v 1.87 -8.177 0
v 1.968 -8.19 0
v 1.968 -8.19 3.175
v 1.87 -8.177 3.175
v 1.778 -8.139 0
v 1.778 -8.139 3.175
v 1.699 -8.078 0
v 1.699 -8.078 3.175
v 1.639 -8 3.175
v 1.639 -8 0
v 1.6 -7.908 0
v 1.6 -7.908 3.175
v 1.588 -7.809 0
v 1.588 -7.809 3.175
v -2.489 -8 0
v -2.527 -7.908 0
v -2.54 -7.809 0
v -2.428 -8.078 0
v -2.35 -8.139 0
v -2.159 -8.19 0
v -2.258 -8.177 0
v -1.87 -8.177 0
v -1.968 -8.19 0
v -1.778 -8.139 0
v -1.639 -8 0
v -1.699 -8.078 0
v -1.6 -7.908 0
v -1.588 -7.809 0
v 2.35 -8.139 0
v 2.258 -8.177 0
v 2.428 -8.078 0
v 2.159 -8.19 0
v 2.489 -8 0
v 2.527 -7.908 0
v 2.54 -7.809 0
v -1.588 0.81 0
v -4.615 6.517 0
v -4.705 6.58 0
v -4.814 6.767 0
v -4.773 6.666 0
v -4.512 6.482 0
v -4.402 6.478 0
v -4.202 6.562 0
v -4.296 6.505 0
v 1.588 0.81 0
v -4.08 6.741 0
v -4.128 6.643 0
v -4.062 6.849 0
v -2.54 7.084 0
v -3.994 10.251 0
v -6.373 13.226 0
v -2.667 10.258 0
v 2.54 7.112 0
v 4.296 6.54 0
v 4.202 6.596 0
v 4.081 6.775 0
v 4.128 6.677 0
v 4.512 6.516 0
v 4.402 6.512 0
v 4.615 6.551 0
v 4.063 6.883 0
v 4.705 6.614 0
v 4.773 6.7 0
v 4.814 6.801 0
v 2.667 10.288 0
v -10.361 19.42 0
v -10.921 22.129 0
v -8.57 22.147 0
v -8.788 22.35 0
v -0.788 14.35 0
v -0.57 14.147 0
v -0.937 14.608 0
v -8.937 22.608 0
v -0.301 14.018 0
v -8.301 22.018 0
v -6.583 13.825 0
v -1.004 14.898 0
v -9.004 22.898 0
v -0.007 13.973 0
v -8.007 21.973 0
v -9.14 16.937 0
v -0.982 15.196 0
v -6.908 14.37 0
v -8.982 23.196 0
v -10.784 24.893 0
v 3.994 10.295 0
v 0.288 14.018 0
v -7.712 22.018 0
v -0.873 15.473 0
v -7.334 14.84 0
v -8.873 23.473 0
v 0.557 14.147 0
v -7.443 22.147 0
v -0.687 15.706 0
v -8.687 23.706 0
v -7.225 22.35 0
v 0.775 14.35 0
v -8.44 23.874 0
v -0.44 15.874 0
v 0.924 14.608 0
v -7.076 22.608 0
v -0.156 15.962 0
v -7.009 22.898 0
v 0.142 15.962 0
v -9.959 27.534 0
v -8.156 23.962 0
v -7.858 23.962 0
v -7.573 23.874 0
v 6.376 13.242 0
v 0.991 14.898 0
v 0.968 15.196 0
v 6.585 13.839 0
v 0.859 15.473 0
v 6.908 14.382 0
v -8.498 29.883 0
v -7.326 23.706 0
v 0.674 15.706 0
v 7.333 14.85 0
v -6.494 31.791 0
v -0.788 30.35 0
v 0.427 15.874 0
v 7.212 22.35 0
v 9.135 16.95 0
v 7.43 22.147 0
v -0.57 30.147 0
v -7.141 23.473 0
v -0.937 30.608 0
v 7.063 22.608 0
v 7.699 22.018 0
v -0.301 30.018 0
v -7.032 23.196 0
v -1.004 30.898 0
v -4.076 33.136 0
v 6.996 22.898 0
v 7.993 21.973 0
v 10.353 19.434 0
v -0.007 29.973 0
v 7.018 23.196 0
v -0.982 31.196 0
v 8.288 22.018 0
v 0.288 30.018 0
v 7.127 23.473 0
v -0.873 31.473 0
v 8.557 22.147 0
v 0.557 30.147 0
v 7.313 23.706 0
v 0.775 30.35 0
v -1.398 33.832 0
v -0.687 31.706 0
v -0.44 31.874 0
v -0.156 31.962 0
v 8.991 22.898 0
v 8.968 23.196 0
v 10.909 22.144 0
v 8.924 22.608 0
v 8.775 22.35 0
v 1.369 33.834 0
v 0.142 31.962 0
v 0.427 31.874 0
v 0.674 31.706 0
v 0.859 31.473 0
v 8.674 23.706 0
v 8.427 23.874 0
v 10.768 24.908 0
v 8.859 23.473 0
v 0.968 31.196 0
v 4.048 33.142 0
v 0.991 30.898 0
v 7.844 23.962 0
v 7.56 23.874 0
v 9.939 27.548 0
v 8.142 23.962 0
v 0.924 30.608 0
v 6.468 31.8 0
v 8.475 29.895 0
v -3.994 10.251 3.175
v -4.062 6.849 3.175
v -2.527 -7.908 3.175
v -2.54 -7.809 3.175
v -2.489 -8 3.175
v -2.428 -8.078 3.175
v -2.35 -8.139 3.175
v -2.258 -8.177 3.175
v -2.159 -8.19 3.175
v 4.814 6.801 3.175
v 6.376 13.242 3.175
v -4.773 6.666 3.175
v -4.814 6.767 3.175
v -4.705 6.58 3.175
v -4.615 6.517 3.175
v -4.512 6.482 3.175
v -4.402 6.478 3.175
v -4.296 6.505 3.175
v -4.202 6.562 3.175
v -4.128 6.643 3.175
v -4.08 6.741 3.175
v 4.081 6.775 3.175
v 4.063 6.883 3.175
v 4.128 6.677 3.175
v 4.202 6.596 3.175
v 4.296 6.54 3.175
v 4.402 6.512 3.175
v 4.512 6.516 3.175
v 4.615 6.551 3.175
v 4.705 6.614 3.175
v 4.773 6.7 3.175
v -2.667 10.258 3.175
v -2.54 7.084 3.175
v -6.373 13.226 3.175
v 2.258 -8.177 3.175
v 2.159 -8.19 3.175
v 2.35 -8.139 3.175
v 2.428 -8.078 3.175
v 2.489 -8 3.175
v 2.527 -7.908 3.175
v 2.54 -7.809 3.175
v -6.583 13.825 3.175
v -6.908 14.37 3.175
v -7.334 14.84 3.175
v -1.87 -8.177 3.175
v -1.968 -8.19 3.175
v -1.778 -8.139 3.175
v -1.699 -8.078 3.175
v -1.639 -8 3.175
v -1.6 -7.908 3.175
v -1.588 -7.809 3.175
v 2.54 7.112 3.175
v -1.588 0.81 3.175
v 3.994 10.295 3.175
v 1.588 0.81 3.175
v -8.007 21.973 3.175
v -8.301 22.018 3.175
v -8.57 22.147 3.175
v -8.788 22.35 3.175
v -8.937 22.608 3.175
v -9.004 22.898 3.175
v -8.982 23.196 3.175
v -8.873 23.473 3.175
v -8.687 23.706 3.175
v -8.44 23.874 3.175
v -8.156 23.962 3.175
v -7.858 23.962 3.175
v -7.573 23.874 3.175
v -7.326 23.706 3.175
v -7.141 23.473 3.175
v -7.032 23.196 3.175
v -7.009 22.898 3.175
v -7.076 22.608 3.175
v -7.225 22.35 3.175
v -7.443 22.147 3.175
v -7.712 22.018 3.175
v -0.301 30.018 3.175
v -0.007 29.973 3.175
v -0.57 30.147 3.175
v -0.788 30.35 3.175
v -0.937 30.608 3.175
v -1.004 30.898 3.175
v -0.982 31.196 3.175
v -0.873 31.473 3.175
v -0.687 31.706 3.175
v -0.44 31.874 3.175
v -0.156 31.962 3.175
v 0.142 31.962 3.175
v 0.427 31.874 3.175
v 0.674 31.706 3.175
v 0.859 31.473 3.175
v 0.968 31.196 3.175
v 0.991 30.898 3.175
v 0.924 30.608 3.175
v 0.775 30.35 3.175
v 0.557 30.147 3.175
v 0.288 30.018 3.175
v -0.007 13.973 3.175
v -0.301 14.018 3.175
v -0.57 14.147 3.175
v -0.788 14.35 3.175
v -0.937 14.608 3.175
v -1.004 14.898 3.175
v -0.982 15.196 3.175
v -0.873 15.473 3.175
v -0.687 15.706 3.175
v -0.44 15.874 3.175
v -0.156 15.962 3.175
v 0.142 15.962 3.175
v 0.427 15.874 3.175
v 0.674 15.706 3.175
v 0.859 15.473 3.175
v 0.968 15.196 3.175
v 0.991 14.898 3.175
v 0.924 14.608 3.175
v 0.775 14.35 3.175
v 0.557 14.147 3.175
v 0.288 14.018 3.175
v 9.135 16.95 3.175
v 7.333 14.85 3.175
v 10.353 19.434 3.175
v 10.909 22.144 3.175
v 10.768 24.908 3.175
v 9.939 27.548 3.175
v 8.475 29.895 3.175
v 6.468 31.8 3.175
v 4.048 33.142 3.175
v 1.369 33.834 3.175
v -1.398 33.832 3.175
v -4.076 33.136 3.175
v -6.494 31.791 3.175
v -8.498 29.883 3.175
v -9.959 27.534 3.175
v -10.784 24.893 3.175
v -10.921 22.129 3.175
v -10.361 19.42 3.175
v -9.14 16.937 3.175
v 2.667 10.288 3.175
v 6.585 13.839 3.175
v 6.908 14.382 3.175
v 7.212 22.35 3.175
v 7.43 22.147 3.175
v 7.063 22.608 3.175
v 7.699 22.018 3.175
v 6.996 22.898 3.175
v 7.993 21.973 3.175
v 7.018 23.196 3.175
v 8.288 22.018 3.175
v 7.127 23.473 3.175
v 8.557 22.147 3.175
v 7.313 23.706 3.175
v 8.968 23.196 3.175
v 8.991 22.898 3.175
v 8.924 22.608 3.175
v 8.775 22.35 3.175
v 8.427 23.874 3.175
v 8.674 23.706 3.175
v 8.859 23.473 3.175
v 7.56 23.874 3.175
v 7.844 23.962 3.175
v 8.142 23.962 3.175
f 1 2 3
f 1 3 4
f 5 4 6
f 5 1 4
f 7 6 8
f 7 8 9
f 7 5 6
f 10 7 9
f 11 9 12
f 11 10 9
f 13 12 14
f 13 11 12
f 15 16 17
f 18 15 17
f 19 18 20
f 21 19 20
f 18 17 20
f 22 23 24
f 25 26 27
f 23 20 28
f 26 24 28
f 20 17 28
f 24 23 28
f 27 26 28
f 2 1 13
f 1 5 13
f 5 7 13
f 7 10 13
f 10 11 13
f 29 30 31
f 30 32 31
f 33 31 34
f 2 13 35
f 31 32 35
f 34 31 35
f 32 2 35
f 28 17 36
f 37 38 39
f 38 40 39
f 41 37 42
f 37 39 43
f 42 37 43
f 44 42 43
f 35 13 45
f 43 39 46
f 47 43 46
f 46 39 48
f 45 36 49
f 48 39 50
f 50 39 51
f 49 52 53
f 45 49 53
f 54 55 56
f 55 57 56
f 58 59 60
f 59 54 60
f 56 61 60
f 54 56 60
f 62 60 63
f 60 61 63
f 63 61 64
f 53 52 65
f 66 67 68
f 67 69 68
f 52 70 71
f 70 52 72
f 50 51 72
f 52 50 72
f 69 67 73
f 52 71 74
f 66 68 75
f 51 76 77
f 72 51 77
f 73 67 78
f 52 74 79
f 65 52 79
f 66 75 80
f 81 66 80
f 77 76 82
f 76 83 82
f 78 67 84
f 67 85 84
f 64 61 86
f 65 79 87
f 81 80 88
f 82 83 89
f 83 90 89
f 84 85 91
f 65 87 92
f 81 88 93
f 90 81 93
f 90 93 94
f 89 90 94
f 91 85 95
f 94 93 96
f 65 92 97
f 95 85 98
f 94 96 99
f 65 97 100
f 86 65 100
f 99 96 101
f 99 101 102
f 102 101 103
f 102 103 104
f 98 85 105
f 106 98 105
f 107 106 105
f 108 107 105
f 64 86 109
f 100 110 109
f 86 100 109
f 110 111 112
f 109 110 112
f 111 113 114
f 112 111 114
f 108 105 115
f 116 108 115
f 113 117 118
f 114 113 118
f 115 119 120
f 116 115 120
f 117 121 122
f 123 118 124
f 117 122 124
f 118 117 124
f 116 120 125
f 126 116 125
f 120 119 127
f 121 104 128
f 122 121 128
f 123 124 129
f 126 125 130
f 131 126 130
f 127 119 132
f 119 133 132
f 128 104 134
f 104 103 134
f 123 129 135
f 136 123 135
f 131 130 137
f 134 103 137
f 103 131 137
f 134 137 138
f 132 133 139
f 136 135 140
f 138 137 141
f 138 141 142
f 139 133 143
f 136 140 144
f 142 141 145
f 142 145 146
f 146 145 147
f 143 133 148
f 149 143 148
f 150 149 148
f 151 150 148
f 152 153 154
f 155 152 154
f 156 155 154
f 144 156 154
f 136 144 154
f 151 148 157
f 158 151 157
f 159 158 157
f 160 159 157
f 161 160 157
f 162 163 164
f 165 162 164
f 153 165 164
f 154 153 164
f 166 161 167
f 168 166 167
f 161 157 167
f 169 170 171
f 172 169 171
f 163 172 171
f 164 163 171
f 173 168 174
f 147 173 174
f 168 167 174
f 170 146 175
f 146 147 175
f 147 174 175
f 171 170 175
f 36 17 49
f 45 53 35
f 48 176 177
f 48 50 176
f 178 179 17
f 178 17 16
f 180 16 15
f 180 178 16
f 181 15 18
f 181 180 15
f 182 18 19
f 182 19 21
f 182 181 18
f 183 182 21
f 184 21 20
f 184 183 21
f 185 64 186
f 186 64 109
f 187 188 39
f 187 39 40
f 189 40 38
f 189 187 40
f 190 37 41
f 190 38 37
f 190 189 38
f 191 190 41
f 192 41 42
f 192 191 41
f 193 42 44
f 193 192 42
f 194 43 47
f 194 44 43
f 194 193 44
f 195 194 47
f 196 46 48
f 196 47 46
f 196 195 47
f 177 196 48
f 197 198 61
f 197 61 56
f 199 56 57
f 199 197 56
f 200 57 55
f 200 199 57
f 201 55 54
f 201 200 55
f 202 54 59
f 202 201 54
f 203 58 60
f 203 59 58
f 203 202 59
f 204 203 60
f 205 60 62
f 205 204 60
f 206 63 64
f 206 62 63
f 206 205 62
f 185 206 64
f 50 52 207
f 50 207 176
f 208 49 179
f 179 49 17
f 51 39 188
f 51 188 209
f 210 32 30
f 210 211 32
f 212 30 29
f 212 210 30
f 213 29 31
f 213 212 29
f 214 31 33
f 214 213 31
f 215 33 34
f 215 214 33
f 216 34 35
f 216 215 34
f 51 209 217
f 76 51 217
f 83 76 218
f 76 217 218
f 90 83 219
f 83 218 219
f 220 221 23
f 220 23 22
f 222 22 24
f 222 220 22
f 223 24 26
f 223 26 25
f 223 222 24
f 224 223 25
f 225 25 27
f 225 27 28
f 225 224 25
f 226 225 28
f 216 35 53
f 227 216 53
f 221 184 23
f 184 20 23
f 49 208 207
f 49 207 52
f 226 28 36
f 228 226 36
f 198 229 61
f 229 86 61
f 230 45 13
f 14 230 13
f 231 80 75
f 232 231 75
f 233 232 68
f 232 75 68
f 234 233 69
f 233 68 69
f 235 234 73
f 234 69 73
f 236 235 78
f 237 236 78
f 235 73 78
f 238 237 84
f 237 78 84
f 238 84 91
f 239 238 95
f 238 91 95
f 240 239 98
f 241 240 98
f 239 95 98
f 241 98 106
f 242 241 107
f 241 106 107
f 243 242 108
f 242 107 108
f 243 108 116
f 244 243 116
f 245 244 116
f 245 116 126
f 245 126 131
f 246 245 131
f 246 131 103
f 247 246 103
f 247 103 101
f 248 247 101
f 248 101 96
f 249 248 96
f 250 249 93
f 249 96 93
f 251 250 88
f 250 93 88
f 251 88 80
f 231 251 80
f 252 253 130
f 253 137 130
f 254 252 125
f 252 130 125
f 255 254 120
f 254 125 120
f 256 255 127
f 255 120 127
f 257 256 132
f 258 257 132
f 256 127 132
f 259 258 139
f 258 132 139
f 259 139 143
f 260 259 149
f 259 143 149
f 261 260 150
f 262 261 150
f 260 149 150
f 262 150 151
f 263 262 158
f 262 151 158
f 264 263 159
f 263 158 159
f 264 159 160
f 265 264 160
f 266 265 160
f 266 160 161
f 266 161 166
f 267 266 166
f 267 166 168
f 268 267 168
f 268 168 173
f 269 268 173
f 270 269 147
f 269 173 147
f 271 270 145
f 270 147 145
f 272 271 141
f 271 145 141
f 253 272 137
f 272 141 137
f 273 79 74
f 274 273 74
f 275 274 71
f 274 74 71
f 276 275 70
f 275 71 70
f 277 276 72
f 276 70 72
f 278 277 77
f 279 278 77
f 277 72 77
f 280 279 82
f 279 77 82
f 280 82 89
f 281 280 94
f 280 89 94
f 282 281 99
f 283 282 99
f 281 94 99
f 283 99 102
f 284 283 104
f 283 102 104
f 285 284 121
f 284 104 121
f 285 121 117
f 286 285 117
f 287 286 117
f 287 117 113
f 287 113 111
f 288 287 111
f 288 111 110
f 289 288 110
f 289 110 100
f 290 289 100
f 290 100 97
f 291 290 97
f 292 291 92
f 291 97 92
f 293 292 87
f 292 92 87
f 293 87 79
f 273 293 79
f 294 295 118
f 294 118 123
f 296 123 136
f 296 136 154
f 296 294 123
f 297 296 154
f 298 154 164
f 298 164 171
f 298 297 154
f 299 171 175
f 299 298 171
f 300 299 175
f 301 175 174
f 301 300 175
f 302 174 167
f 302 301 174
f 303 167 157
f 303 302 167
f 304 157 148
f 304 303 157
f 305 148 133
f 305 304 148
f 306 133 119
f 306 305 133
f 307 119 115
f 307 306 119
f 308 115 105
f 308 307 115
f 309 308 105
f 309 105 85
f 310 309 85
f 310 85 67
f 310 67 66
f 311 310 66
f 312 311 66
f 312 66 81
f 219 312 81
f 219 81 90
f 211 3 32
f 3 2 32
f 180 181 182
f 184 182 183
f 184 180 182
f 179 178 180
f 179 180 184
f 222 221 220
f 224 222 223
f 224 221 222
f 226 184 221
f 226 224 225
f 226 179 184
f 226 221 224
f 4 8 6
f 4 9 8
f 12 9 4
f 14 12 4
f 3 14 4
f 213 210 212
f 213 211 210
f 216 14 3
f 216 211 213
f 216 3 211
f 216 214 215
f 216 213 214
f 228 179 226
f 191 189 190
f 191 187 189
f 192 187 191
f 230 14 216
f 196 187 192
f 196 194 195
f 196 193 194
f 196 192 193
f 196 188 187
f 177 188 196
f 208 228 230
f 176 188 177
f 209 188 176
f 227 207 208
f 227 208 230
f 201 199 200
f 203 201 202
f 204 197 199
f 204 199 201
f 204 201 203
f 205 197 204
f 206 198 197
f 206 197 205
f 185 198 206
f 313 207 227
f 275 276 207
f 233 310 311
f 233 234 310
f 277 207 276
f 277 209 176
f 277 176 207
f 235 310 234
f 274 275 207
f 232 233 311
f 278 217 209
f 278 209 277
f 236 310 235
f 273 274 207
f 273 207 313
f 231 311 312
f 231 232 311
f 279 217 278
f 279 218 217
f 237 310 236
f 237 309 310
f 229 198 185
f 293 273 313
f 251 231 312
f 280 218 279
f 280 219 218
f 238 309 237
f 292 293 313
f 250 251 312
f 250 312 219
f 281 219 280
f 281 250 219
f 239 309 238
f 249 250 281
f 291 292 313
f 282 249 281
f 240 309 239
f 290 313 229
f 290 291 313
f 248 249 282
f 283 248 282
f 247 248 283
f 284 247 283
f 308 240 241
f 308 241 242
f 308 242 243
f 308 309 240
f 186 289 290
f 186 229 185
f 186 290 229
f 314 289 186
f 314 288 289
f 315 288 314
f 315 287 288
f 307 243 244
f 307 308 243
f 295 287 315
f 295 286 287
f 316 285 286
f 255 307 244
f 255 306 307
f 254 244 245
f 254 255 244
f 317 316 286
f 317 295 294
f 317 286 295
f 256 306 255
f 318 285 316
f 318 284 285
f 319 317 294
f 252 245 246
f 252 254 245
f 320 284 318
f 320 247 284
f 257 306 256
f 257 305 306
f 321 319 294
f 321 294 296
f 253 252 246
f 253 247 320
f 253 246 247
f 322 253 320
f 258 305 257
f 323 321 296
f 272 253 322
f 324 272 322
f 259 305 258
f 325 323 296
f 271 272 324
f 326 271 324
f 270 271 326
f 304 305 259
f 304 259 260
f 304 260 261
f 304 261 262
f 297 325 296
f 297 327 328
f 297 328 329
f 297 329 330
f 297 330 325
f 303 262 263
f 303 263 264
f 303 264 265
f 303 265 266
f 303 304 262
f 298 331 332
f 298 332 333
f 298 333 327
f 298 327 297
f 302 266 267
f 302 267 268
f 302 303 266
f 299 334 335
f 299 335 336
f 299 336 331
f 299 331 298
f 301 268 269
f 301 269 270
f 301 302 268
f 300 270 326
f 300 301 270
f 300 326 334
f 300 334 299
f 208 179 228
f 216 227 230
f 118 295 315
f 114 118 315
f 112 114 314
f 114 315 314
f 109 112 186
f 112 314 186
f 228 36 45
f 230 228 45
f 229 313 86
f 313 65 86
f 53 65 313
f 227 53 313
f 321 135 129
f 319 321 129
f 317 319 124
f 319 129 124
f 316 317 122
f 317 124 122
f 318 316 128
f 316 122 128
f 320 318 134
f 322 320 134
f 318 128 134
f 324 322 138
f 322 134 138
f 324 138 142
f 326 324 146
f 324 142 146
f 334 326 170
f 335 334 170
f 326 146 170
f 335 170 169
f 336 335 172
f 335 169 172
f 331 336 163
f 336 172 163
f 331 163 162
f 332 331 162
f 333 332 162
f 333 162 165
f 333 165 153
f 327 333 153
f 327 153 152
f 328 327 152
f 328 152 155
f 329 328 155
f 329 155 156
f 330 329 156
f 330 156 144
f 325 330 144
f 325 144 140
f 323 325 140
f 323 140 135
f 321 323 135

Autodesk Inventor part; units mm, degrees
ref_plane "YZ Plane" through (0, 0, 0) normal (1, 0, 0) x (0, 1, 0)
ref_plane "XZ Plane" through (0, 0, 0) normal (0, 1, 0) x (-1, 0, 0)
ref_plane "XY Plane" through (0, 0, 0) normal (0, 0, 1) x (1, 0, 0)
ref_plane "Work Plane1" through (0, -7.809, 0) normal (-1, 0, 0) x (0, 0, 1)
ref_plane "Work Plane2" through (0, 0, 1.5875) normal (0, 0, 1) x (1, 0, 0)
sketch "Sketch1" plane through (0, 0, 0) normal (0, 0, 1) x (1, 0, 0)
  line L0 (-2.54, -8.19) -> (2.54, -8.19)
  line L1 (2.54, -8.19) -> (2.54, 8.19)
  line L2 (-2.54, 8.19) -> (-2.54, -8.19)
  line L3 (-2.54, -8.19) -> (2.54, 8.19) construction
  line L4 (2.54, -8.19) -> (-2.54, 8.19) construction
  circle A0 centre (0, 16.6545) radius 2.5 construction
  circle A1 centre (0, 16.6545) radius 5
  arc A2 (6.8029, 15.0051) -> (-6.8044, 15.0114) centre (0, 16.6545) ccw
  line L5 (-2.54, 8.19) -> (-2.54, 10.2591)
  line L6 (2.54, 8.19) -> (2.54, 10.2869)
  line L7 (0, 0) -> (0, 10.7842) construction
  line L8 (-2.54, 10.2591) -> (-3.9944, 10.2511)
  line L9 (2.54, 10.2869) -> (3.9944, 10.2948)
  line L10 (-3.9944, 10.2511) -> (-4.1214, 3.9003)
  line L11 (3.9944, 10.2948) -> (4.1214, 3.9454)
  line L12 (-4.1214, 3.9003) -> (-6.8044, 15.0114)
  line L13 (4.1214, 3.9454) -> (6.8029, 15.0051)
  line L14 (0, 0) -> (0, 22.9511) construction
  point P0 (-3.2672, 10.2551)
  dimension "d16" = 0
  dimension "d2" = 5
  dimension "d3" = 10
  dimension "d4" = 14
  dimension "d8" = 1.5815
  dimension "d9" = 1.5815
  dimension "d10" = 6.35
  dimension "d11" = 6.35
  dimension "d18" = 1.4545
  dimension "d19" = 1.4545
  dimension "d31" = 2.54
  dimension "d32" = 2.54
  dimension "d33" = 0
extrude "Plate1" add sketch "Sketch1" along normal blind 3.175
sketch "Sketch2" plane through (0, 0, 0) normal (0, 0, -1) x (-1, 0, 0)
  circle A0 centre (0, 16.6545) radius 5 projected
  line L0 (-3.9944, 10.2948) -> (-4.1214, 3.9454) projected
  line L1 (-2.54, 10.2869) -> (-3.9944, 10.2948) projected
  line L2 (-2.54, -8.19) -> (-2.54, 10.2869) projected
  line L3 (2.54, -8.19) -> (-2.54, -8.19) projected
  line L4 (2.54, 10.2591) -> (2.54, -8.19) projected
  line L5 (3.9944, 10.2511) -> (2.54, 10.2591) projected
  line L6 (4.1214, 3.9003) -> (3.9944, 10.2511) projected
  line L7 (6.8044, 15.0114) -> (4.1214, 3.9003) projected
  arc A1 (6.8044, 15.0114) -> (-6.8029, 15.0051) centre (0, 16.6545) ccw projected
  line L8 (-4.1214, 3.9454) -> (-6.8029, 15.0051) projected
  line L9 (-1.5875, -17.19) -> (1.5875, -17.19)
  line L10 (1.5875, -17.19) -> (1.5875, 0.81)
  line L11 (1.5875, 0.81) -> (-1.5875, 0.81)
  line L12 (-1.5875, 0.81) -> (-1.5875, -17.19)
  line L13 (-1.5875, -17.19) -> (1.5875, 0.81) construction
  line L14 (1.5875, -17.19) -> (-1.5875, 0.81) construction
  point P0 (0, 0)
  point P1 (0, -8.19)
  dimension "d14" = 3.175
extrude "Extrusion1" cut sketch "Sketch2" against normal blind 25.4 contours L12 L11 L10 L3 | L3 L10 L9 L12
sketch "Sketch3" plane through (0, 0, 3.175) normal (0, 0, 1) x (1, 0, 0)
  circle A0 centre (-37.757, 0) radius 3
  line L0 (-39.3445, -2.5456) -> (-36.1695, -2.5456)
  line L1 (-36.1695, -2.5456) -> (-36.1695, 2.5456)
  line L2 (-36.1695, 2.5456) -> (-39.3445, 2.5456)
  line L3 (-39.3445, 2.5456) -> (-39.3445, -2.5456)
  line L4 (-39.3445, -2.5456) -> (-36.1695, 2.5456) construction
  line L5 (-36.1695, -2.5456) -> (-39.3445, 2.5456) construction
  circle A1 centre (-37.757, 0) radius 4
  point P0 (0, 0)
  point P1 (-37.757, 3)
  point P2 (-37.757, 4)
  dimension "d35" = 8
  dimension "d28" = 6
  dimension "d29" = 3.175
  dimension "d30" = 5.0911
  dimension "d34" = 0.4545
  dimension "d36" = 1.4545
fillet "Fillet4" radius 0.381 6 edges at (-4.1214, 3.9003, 1.5875) (4.1214, 3.9454, 1.5875) (-2.54, -8.19, 1.5875) (-1.5875, -8.19, 1.5875) (1.5875, -8.19, 1.5875) (2.54, -8.19, 1.5875)
sketch "Sketch4" plane through (0, 0, 3.175) normal (0, 0, 1) x (1, 0, 0)
  arc A0 (2.159, -8.19) -> (2.54, -7.809) centre (2.159, -7.809) ccw projected
  line L0 (2.54, 10.2869) -> (2.54, -7.809) projected
  line L1 (3.9944, 10.2948) -> (2.54, 10.2869) projected
  line L2 (4.0627, 6.8835) -> (3.9944, 10.2948) projected
  arc A1 (4.0627, 6.8835) -> (4.8139, 6.8013) centre (4.4436, 6.8911) ccw projected
  line L3 (6.8029, 15.0051) -> (4.8139, 6.8013) projected
  arc A2 (6.8029, 15.0051) -> (-6.8044, 15.0114) centre (0, 16.6545) ccw projected
  line L4 (-4.8137, 6.7674) -> (-6.8044, 15.0114) projected
  arc A3 (-4.8137, 6.7674) -> (-4.0625, 6.8492) centre (-4.4434, 6.8568) ccw projected
  line L5 (-3.9944, 10.2511) -> (-4.0625, 6.8492) projected
  line L6 (-2.54, 10.2591) -> (-3.9944, 10.2511) projected
  line L7 (-2.54, -7.809) -> (-2.54, 10.2591) projected
  arc A4 (-2.54, -7.809) -> (-2.159, -8.19) centre (-2.159, -7.809) ccw projected
  line L8 (-1.9685, -8.19) -> (-2.159, -8.19) projected
  arc A5 (-1.9685, -8.19) -> (-1.5875, -7.809) centre (-1.9685, -7.809) ccw projected
  line L9 (-1.5875, -7.809) -> (-1.5875, 0.81) projected
  line L10 (-1.5875, 0.81) -> (1.5875, 0.81) projected
  line L11 (1.5875, 0.81) -> (1.5875, -7.809) projected
  arc A6 (1.5875, -7.809) -> (1.9685, -8.19) centre (1.9685, -7.809) ccw projected
  line L12 (2.159, -8.19) -> (1.9685, -8.19) projected
  circle A7 centre (0, 16.6545) radius 5 projected
  point P0 (0, 0)
extrude "Extrusion2" add sketch "Sketch4" against normal up to surface (3.175 mm away) contours A7
sketch "Sketch5" plane through (0, 0, 3.175) normal (0, 0, 1) x (1, 0, 0)
  arc A0 (2.159, -8.19) -> (2.54, -7.809) centre (2.159, -7.809) ccw projected
  line L0 (2.54, 10.2869) -> (2.54, -7.809) projected
  line L1 (3.9944, 10.2948) -> (2.54, 10.2869) projected
  line L2 (4.0627, 6.8835) -> (3.9944, 10.2948) projected
  arc A1 (4.0627, 6.8835) -> (4.8139, 6.8013) centre (4.4436, 6.8911) ccw projected
  line L3 (6.8029, 15.0051) -> (4.8139, 6.8013) projected
  arc A2 (6.8029, 15.0051) -> (-6.8044, 15.0114) centre (0, 16.6545) ccw projected
  line L4 (-4.8137, 6.7674) -> (-6.8044, 15.0114) projected
  arc A3 (-4.8137, 6.7674) -> (-4.0625, 6.8492) centre (-4.4434, 6.8568) ccw projected
  line L5 (-3.9944, 10.2511) -> (-4.0625, 6.8492) projected
  line L6 (-2.54, 10.2591) -> (-3.9944, 10.2511) projected
  line L7 (-2.54, -7.809) -> (-2.54, 10.2591) projected
  arc A4 (-2.54, -7.809) -> (-2.159, -8.19) centre (-2.159, -7.809) ccw projected
  line L8 (-1.9685, -8.19) -> (-2.159, -8.19) projected
  arc A5 (-1.9685, -8.19) -> (-1.5875, -7.809) centre (-1.9685, -7.809) ccw projected
  line L9 (-1.5875, -7.809) -> (-1.5875, 0.81) projected
  line L10 (-1.5875, 0.81) -> (1.5875, 0.81) projected
  line L11 (1.5875, 0.81) -> (1.5875, -7.809) projected
  arc A6 (1.5875, -7.809) -> (1.9685, -8.19) centre (1.9685, -7.809) ccw projected
  line L12 (2.159, -8.19) -> (1.9685, -8.19) projected
  arc A7 (1.5644, 14.7045) -> (-1.5644, 14.7045) centre (0, 16.6545) ccw
  line L13 (1.5644, 14.7045) -> (-1.5644, 14.7045)
  point P0 (0, 0)
  point P1 (0, 19.1545)
  dimension "d40" = 5
  dimension "d44" = 4.45
extrude "Extrusion3" cut sketch "Sketch5" against normal blind 25.4 contours L13 A7
sketch "Sketch6" plane through (0, 0, 3.175) normal (0, 0, 1) x (1, 0, 0)
  circle A0 centre (-0.0066, 22.9731) radius 10.9474
  line L0 (3.9944, 10.2948) -> (2.54, 10.2869) projected
  point P0 (0, 0)
  dimension "d45" = 21.8948
  dimension "d46" = 12.7
extrude "Extrusion4" add sketch "Sketch6" against normal up to surface (3.175 mm away)
fillet "Fillet5" radius 3.175 2 edges at (-6.6204, 14.2495, 1.5875) (6.6225, 14.2611, 1.5875)
chamfer "Chamfer3" distance 0.127 distance2 3.175 1 edges at (-2.54, 10.2591, 1.5875) measured on face at (-3.5096, 10.2538, 1.0583)
chamfer "Chamfer4" distance 3.175 distance2 0.127 1 edges at (2.54, 10.2869, 1.5875) measured on face at (2.54, -1.7771, 1.0583)
sketch "Sketch7" plane through (0, 0, 3.175) normal (0, 0, 1) x (1, 0, 0)
  line L0 (-4.8137, 6.7674) -> (-6.3734, 13.2264) projected
  arc A0 (-4.8137, 6.7674) -> (-4.0625, 6.8492) centre (-4.4434, 6.8568) ccw projected
  line L1 (-3.9944, 10.2511) -> (-4.0625, 6.8492) projected
  line L2 (-2.667, 10.2584) -> (-3.9944, 10.2511) projected
  line L3 (-2.54, 7.0841) -> (-2.667, 10.2584) projected
  line L4 (-2.54, -7.809) -> (-2.54, 7.0841) projected
  arc A1 (-2.54, -7.809) -> (-2.159, -8.19) centre (-2.159, -7.809) ccw projected
  line L5 (-1.9685, -8.19) -> (-2.159, -8.19) projected
  arc A2 (-1.9685, -8.19) -> (-1.5875, -7.809) centre (-1.9685, -7.809) ccw projected
  line L6 (-1.5875, -7.809) -> (-1.5875, 0.81) projected
  line L7 (-1.5875, 0.81) -> (1.5875, 0.81) projected
  line L8 (1.5875, 0.81) -> (1.5875, -7.809) projected
  arc A3 (1.5875, -7.809) -> (1.9685, -8.19) centre (1.9685, -7.809) ccw projected
  line L9 (2.159, -8.19) -> (1.9685, -8.19) projected
  arc A4 (2.159, -8.19) -> (2.54, -7.809) centre (2.159, -7.809) ccw projected
  line L10 (2.54, 7.1119) -> (2.54, -7.809) projected
  line L11 (2.667, 10.2876) -> (2.54, 7.1119) projected
  line L12 (3.9944, 10.2948) -> (2.667, 10.2876) projected
  line L13 (4.0627, 6.8835) -> (3.9944, 10.2948) projected
  arc A5 (4.0627, 6.8835) -> (4.8139, 6.8013) centre (4.4436, 6.8911) ccw projected
  line L14 (6.3756, 13.2425) -> (4.8139, 6.8013) projected
  arc A6 (7.3326, 14.8503) -> (6.3756, 13.2425) centre (9.4612, 12.4944) ccw projected
  arc A7 (7.3326, 14.8503) -> (-7.3345, 14.84) centre (-0.0066, 22.9731) ccw projected
  arc A8 (-6.3734, 13.2264) -> (-7.3345, 14.84) centre (-9.4597, 12.4812) ccw projected
  circle A9 centre (-0.0066, 22.9731) radius 8
  point P0 (0, 0)
  point P1 (-0.0066, 14.9731)
  point P2 (-0.0066, 30.9731)
  point P3 (-8.0066, 22.9731)
  point P4 (7.9934, 22.9731)
  dimension "d56" = 16
hole "Hole1" at (-0.0066, 14.9731, 3.175) at (-0.0066, 30.9731, 3.175) at (-8.0066, 22.9731, 3.175) at (7.9934, 22.9731, 3.175) direction (0, 0, -1) diameter 2 end through all
equation "\"d18\" = d36"
equation "\"d19\" = d36"
equation "\"d62\" = Thickness"
equation "\"BendRadius\" = Thickness"
equation "\"BendReliefWidth\" = Thickness"
equation "\"BendReliefDepth\" = 0.5 * Thickness"
equation "\"CornerReliefSize\" = 4 * Thickness"
equation "\"MinimumRemnant\" = 2 * Thickness"
equation "\"TransitionRadius\" = BendRadius"
equation "\"JacobiRadiusSize\" = BendRadius"
equation "\"GapSize\" = Thickness"
equation "\"d12\" = BendRadius"
equation "\"Thickness\" = 3.175"
properties part number "8mm OD 6mm ID Rod End125Dynamixel"
